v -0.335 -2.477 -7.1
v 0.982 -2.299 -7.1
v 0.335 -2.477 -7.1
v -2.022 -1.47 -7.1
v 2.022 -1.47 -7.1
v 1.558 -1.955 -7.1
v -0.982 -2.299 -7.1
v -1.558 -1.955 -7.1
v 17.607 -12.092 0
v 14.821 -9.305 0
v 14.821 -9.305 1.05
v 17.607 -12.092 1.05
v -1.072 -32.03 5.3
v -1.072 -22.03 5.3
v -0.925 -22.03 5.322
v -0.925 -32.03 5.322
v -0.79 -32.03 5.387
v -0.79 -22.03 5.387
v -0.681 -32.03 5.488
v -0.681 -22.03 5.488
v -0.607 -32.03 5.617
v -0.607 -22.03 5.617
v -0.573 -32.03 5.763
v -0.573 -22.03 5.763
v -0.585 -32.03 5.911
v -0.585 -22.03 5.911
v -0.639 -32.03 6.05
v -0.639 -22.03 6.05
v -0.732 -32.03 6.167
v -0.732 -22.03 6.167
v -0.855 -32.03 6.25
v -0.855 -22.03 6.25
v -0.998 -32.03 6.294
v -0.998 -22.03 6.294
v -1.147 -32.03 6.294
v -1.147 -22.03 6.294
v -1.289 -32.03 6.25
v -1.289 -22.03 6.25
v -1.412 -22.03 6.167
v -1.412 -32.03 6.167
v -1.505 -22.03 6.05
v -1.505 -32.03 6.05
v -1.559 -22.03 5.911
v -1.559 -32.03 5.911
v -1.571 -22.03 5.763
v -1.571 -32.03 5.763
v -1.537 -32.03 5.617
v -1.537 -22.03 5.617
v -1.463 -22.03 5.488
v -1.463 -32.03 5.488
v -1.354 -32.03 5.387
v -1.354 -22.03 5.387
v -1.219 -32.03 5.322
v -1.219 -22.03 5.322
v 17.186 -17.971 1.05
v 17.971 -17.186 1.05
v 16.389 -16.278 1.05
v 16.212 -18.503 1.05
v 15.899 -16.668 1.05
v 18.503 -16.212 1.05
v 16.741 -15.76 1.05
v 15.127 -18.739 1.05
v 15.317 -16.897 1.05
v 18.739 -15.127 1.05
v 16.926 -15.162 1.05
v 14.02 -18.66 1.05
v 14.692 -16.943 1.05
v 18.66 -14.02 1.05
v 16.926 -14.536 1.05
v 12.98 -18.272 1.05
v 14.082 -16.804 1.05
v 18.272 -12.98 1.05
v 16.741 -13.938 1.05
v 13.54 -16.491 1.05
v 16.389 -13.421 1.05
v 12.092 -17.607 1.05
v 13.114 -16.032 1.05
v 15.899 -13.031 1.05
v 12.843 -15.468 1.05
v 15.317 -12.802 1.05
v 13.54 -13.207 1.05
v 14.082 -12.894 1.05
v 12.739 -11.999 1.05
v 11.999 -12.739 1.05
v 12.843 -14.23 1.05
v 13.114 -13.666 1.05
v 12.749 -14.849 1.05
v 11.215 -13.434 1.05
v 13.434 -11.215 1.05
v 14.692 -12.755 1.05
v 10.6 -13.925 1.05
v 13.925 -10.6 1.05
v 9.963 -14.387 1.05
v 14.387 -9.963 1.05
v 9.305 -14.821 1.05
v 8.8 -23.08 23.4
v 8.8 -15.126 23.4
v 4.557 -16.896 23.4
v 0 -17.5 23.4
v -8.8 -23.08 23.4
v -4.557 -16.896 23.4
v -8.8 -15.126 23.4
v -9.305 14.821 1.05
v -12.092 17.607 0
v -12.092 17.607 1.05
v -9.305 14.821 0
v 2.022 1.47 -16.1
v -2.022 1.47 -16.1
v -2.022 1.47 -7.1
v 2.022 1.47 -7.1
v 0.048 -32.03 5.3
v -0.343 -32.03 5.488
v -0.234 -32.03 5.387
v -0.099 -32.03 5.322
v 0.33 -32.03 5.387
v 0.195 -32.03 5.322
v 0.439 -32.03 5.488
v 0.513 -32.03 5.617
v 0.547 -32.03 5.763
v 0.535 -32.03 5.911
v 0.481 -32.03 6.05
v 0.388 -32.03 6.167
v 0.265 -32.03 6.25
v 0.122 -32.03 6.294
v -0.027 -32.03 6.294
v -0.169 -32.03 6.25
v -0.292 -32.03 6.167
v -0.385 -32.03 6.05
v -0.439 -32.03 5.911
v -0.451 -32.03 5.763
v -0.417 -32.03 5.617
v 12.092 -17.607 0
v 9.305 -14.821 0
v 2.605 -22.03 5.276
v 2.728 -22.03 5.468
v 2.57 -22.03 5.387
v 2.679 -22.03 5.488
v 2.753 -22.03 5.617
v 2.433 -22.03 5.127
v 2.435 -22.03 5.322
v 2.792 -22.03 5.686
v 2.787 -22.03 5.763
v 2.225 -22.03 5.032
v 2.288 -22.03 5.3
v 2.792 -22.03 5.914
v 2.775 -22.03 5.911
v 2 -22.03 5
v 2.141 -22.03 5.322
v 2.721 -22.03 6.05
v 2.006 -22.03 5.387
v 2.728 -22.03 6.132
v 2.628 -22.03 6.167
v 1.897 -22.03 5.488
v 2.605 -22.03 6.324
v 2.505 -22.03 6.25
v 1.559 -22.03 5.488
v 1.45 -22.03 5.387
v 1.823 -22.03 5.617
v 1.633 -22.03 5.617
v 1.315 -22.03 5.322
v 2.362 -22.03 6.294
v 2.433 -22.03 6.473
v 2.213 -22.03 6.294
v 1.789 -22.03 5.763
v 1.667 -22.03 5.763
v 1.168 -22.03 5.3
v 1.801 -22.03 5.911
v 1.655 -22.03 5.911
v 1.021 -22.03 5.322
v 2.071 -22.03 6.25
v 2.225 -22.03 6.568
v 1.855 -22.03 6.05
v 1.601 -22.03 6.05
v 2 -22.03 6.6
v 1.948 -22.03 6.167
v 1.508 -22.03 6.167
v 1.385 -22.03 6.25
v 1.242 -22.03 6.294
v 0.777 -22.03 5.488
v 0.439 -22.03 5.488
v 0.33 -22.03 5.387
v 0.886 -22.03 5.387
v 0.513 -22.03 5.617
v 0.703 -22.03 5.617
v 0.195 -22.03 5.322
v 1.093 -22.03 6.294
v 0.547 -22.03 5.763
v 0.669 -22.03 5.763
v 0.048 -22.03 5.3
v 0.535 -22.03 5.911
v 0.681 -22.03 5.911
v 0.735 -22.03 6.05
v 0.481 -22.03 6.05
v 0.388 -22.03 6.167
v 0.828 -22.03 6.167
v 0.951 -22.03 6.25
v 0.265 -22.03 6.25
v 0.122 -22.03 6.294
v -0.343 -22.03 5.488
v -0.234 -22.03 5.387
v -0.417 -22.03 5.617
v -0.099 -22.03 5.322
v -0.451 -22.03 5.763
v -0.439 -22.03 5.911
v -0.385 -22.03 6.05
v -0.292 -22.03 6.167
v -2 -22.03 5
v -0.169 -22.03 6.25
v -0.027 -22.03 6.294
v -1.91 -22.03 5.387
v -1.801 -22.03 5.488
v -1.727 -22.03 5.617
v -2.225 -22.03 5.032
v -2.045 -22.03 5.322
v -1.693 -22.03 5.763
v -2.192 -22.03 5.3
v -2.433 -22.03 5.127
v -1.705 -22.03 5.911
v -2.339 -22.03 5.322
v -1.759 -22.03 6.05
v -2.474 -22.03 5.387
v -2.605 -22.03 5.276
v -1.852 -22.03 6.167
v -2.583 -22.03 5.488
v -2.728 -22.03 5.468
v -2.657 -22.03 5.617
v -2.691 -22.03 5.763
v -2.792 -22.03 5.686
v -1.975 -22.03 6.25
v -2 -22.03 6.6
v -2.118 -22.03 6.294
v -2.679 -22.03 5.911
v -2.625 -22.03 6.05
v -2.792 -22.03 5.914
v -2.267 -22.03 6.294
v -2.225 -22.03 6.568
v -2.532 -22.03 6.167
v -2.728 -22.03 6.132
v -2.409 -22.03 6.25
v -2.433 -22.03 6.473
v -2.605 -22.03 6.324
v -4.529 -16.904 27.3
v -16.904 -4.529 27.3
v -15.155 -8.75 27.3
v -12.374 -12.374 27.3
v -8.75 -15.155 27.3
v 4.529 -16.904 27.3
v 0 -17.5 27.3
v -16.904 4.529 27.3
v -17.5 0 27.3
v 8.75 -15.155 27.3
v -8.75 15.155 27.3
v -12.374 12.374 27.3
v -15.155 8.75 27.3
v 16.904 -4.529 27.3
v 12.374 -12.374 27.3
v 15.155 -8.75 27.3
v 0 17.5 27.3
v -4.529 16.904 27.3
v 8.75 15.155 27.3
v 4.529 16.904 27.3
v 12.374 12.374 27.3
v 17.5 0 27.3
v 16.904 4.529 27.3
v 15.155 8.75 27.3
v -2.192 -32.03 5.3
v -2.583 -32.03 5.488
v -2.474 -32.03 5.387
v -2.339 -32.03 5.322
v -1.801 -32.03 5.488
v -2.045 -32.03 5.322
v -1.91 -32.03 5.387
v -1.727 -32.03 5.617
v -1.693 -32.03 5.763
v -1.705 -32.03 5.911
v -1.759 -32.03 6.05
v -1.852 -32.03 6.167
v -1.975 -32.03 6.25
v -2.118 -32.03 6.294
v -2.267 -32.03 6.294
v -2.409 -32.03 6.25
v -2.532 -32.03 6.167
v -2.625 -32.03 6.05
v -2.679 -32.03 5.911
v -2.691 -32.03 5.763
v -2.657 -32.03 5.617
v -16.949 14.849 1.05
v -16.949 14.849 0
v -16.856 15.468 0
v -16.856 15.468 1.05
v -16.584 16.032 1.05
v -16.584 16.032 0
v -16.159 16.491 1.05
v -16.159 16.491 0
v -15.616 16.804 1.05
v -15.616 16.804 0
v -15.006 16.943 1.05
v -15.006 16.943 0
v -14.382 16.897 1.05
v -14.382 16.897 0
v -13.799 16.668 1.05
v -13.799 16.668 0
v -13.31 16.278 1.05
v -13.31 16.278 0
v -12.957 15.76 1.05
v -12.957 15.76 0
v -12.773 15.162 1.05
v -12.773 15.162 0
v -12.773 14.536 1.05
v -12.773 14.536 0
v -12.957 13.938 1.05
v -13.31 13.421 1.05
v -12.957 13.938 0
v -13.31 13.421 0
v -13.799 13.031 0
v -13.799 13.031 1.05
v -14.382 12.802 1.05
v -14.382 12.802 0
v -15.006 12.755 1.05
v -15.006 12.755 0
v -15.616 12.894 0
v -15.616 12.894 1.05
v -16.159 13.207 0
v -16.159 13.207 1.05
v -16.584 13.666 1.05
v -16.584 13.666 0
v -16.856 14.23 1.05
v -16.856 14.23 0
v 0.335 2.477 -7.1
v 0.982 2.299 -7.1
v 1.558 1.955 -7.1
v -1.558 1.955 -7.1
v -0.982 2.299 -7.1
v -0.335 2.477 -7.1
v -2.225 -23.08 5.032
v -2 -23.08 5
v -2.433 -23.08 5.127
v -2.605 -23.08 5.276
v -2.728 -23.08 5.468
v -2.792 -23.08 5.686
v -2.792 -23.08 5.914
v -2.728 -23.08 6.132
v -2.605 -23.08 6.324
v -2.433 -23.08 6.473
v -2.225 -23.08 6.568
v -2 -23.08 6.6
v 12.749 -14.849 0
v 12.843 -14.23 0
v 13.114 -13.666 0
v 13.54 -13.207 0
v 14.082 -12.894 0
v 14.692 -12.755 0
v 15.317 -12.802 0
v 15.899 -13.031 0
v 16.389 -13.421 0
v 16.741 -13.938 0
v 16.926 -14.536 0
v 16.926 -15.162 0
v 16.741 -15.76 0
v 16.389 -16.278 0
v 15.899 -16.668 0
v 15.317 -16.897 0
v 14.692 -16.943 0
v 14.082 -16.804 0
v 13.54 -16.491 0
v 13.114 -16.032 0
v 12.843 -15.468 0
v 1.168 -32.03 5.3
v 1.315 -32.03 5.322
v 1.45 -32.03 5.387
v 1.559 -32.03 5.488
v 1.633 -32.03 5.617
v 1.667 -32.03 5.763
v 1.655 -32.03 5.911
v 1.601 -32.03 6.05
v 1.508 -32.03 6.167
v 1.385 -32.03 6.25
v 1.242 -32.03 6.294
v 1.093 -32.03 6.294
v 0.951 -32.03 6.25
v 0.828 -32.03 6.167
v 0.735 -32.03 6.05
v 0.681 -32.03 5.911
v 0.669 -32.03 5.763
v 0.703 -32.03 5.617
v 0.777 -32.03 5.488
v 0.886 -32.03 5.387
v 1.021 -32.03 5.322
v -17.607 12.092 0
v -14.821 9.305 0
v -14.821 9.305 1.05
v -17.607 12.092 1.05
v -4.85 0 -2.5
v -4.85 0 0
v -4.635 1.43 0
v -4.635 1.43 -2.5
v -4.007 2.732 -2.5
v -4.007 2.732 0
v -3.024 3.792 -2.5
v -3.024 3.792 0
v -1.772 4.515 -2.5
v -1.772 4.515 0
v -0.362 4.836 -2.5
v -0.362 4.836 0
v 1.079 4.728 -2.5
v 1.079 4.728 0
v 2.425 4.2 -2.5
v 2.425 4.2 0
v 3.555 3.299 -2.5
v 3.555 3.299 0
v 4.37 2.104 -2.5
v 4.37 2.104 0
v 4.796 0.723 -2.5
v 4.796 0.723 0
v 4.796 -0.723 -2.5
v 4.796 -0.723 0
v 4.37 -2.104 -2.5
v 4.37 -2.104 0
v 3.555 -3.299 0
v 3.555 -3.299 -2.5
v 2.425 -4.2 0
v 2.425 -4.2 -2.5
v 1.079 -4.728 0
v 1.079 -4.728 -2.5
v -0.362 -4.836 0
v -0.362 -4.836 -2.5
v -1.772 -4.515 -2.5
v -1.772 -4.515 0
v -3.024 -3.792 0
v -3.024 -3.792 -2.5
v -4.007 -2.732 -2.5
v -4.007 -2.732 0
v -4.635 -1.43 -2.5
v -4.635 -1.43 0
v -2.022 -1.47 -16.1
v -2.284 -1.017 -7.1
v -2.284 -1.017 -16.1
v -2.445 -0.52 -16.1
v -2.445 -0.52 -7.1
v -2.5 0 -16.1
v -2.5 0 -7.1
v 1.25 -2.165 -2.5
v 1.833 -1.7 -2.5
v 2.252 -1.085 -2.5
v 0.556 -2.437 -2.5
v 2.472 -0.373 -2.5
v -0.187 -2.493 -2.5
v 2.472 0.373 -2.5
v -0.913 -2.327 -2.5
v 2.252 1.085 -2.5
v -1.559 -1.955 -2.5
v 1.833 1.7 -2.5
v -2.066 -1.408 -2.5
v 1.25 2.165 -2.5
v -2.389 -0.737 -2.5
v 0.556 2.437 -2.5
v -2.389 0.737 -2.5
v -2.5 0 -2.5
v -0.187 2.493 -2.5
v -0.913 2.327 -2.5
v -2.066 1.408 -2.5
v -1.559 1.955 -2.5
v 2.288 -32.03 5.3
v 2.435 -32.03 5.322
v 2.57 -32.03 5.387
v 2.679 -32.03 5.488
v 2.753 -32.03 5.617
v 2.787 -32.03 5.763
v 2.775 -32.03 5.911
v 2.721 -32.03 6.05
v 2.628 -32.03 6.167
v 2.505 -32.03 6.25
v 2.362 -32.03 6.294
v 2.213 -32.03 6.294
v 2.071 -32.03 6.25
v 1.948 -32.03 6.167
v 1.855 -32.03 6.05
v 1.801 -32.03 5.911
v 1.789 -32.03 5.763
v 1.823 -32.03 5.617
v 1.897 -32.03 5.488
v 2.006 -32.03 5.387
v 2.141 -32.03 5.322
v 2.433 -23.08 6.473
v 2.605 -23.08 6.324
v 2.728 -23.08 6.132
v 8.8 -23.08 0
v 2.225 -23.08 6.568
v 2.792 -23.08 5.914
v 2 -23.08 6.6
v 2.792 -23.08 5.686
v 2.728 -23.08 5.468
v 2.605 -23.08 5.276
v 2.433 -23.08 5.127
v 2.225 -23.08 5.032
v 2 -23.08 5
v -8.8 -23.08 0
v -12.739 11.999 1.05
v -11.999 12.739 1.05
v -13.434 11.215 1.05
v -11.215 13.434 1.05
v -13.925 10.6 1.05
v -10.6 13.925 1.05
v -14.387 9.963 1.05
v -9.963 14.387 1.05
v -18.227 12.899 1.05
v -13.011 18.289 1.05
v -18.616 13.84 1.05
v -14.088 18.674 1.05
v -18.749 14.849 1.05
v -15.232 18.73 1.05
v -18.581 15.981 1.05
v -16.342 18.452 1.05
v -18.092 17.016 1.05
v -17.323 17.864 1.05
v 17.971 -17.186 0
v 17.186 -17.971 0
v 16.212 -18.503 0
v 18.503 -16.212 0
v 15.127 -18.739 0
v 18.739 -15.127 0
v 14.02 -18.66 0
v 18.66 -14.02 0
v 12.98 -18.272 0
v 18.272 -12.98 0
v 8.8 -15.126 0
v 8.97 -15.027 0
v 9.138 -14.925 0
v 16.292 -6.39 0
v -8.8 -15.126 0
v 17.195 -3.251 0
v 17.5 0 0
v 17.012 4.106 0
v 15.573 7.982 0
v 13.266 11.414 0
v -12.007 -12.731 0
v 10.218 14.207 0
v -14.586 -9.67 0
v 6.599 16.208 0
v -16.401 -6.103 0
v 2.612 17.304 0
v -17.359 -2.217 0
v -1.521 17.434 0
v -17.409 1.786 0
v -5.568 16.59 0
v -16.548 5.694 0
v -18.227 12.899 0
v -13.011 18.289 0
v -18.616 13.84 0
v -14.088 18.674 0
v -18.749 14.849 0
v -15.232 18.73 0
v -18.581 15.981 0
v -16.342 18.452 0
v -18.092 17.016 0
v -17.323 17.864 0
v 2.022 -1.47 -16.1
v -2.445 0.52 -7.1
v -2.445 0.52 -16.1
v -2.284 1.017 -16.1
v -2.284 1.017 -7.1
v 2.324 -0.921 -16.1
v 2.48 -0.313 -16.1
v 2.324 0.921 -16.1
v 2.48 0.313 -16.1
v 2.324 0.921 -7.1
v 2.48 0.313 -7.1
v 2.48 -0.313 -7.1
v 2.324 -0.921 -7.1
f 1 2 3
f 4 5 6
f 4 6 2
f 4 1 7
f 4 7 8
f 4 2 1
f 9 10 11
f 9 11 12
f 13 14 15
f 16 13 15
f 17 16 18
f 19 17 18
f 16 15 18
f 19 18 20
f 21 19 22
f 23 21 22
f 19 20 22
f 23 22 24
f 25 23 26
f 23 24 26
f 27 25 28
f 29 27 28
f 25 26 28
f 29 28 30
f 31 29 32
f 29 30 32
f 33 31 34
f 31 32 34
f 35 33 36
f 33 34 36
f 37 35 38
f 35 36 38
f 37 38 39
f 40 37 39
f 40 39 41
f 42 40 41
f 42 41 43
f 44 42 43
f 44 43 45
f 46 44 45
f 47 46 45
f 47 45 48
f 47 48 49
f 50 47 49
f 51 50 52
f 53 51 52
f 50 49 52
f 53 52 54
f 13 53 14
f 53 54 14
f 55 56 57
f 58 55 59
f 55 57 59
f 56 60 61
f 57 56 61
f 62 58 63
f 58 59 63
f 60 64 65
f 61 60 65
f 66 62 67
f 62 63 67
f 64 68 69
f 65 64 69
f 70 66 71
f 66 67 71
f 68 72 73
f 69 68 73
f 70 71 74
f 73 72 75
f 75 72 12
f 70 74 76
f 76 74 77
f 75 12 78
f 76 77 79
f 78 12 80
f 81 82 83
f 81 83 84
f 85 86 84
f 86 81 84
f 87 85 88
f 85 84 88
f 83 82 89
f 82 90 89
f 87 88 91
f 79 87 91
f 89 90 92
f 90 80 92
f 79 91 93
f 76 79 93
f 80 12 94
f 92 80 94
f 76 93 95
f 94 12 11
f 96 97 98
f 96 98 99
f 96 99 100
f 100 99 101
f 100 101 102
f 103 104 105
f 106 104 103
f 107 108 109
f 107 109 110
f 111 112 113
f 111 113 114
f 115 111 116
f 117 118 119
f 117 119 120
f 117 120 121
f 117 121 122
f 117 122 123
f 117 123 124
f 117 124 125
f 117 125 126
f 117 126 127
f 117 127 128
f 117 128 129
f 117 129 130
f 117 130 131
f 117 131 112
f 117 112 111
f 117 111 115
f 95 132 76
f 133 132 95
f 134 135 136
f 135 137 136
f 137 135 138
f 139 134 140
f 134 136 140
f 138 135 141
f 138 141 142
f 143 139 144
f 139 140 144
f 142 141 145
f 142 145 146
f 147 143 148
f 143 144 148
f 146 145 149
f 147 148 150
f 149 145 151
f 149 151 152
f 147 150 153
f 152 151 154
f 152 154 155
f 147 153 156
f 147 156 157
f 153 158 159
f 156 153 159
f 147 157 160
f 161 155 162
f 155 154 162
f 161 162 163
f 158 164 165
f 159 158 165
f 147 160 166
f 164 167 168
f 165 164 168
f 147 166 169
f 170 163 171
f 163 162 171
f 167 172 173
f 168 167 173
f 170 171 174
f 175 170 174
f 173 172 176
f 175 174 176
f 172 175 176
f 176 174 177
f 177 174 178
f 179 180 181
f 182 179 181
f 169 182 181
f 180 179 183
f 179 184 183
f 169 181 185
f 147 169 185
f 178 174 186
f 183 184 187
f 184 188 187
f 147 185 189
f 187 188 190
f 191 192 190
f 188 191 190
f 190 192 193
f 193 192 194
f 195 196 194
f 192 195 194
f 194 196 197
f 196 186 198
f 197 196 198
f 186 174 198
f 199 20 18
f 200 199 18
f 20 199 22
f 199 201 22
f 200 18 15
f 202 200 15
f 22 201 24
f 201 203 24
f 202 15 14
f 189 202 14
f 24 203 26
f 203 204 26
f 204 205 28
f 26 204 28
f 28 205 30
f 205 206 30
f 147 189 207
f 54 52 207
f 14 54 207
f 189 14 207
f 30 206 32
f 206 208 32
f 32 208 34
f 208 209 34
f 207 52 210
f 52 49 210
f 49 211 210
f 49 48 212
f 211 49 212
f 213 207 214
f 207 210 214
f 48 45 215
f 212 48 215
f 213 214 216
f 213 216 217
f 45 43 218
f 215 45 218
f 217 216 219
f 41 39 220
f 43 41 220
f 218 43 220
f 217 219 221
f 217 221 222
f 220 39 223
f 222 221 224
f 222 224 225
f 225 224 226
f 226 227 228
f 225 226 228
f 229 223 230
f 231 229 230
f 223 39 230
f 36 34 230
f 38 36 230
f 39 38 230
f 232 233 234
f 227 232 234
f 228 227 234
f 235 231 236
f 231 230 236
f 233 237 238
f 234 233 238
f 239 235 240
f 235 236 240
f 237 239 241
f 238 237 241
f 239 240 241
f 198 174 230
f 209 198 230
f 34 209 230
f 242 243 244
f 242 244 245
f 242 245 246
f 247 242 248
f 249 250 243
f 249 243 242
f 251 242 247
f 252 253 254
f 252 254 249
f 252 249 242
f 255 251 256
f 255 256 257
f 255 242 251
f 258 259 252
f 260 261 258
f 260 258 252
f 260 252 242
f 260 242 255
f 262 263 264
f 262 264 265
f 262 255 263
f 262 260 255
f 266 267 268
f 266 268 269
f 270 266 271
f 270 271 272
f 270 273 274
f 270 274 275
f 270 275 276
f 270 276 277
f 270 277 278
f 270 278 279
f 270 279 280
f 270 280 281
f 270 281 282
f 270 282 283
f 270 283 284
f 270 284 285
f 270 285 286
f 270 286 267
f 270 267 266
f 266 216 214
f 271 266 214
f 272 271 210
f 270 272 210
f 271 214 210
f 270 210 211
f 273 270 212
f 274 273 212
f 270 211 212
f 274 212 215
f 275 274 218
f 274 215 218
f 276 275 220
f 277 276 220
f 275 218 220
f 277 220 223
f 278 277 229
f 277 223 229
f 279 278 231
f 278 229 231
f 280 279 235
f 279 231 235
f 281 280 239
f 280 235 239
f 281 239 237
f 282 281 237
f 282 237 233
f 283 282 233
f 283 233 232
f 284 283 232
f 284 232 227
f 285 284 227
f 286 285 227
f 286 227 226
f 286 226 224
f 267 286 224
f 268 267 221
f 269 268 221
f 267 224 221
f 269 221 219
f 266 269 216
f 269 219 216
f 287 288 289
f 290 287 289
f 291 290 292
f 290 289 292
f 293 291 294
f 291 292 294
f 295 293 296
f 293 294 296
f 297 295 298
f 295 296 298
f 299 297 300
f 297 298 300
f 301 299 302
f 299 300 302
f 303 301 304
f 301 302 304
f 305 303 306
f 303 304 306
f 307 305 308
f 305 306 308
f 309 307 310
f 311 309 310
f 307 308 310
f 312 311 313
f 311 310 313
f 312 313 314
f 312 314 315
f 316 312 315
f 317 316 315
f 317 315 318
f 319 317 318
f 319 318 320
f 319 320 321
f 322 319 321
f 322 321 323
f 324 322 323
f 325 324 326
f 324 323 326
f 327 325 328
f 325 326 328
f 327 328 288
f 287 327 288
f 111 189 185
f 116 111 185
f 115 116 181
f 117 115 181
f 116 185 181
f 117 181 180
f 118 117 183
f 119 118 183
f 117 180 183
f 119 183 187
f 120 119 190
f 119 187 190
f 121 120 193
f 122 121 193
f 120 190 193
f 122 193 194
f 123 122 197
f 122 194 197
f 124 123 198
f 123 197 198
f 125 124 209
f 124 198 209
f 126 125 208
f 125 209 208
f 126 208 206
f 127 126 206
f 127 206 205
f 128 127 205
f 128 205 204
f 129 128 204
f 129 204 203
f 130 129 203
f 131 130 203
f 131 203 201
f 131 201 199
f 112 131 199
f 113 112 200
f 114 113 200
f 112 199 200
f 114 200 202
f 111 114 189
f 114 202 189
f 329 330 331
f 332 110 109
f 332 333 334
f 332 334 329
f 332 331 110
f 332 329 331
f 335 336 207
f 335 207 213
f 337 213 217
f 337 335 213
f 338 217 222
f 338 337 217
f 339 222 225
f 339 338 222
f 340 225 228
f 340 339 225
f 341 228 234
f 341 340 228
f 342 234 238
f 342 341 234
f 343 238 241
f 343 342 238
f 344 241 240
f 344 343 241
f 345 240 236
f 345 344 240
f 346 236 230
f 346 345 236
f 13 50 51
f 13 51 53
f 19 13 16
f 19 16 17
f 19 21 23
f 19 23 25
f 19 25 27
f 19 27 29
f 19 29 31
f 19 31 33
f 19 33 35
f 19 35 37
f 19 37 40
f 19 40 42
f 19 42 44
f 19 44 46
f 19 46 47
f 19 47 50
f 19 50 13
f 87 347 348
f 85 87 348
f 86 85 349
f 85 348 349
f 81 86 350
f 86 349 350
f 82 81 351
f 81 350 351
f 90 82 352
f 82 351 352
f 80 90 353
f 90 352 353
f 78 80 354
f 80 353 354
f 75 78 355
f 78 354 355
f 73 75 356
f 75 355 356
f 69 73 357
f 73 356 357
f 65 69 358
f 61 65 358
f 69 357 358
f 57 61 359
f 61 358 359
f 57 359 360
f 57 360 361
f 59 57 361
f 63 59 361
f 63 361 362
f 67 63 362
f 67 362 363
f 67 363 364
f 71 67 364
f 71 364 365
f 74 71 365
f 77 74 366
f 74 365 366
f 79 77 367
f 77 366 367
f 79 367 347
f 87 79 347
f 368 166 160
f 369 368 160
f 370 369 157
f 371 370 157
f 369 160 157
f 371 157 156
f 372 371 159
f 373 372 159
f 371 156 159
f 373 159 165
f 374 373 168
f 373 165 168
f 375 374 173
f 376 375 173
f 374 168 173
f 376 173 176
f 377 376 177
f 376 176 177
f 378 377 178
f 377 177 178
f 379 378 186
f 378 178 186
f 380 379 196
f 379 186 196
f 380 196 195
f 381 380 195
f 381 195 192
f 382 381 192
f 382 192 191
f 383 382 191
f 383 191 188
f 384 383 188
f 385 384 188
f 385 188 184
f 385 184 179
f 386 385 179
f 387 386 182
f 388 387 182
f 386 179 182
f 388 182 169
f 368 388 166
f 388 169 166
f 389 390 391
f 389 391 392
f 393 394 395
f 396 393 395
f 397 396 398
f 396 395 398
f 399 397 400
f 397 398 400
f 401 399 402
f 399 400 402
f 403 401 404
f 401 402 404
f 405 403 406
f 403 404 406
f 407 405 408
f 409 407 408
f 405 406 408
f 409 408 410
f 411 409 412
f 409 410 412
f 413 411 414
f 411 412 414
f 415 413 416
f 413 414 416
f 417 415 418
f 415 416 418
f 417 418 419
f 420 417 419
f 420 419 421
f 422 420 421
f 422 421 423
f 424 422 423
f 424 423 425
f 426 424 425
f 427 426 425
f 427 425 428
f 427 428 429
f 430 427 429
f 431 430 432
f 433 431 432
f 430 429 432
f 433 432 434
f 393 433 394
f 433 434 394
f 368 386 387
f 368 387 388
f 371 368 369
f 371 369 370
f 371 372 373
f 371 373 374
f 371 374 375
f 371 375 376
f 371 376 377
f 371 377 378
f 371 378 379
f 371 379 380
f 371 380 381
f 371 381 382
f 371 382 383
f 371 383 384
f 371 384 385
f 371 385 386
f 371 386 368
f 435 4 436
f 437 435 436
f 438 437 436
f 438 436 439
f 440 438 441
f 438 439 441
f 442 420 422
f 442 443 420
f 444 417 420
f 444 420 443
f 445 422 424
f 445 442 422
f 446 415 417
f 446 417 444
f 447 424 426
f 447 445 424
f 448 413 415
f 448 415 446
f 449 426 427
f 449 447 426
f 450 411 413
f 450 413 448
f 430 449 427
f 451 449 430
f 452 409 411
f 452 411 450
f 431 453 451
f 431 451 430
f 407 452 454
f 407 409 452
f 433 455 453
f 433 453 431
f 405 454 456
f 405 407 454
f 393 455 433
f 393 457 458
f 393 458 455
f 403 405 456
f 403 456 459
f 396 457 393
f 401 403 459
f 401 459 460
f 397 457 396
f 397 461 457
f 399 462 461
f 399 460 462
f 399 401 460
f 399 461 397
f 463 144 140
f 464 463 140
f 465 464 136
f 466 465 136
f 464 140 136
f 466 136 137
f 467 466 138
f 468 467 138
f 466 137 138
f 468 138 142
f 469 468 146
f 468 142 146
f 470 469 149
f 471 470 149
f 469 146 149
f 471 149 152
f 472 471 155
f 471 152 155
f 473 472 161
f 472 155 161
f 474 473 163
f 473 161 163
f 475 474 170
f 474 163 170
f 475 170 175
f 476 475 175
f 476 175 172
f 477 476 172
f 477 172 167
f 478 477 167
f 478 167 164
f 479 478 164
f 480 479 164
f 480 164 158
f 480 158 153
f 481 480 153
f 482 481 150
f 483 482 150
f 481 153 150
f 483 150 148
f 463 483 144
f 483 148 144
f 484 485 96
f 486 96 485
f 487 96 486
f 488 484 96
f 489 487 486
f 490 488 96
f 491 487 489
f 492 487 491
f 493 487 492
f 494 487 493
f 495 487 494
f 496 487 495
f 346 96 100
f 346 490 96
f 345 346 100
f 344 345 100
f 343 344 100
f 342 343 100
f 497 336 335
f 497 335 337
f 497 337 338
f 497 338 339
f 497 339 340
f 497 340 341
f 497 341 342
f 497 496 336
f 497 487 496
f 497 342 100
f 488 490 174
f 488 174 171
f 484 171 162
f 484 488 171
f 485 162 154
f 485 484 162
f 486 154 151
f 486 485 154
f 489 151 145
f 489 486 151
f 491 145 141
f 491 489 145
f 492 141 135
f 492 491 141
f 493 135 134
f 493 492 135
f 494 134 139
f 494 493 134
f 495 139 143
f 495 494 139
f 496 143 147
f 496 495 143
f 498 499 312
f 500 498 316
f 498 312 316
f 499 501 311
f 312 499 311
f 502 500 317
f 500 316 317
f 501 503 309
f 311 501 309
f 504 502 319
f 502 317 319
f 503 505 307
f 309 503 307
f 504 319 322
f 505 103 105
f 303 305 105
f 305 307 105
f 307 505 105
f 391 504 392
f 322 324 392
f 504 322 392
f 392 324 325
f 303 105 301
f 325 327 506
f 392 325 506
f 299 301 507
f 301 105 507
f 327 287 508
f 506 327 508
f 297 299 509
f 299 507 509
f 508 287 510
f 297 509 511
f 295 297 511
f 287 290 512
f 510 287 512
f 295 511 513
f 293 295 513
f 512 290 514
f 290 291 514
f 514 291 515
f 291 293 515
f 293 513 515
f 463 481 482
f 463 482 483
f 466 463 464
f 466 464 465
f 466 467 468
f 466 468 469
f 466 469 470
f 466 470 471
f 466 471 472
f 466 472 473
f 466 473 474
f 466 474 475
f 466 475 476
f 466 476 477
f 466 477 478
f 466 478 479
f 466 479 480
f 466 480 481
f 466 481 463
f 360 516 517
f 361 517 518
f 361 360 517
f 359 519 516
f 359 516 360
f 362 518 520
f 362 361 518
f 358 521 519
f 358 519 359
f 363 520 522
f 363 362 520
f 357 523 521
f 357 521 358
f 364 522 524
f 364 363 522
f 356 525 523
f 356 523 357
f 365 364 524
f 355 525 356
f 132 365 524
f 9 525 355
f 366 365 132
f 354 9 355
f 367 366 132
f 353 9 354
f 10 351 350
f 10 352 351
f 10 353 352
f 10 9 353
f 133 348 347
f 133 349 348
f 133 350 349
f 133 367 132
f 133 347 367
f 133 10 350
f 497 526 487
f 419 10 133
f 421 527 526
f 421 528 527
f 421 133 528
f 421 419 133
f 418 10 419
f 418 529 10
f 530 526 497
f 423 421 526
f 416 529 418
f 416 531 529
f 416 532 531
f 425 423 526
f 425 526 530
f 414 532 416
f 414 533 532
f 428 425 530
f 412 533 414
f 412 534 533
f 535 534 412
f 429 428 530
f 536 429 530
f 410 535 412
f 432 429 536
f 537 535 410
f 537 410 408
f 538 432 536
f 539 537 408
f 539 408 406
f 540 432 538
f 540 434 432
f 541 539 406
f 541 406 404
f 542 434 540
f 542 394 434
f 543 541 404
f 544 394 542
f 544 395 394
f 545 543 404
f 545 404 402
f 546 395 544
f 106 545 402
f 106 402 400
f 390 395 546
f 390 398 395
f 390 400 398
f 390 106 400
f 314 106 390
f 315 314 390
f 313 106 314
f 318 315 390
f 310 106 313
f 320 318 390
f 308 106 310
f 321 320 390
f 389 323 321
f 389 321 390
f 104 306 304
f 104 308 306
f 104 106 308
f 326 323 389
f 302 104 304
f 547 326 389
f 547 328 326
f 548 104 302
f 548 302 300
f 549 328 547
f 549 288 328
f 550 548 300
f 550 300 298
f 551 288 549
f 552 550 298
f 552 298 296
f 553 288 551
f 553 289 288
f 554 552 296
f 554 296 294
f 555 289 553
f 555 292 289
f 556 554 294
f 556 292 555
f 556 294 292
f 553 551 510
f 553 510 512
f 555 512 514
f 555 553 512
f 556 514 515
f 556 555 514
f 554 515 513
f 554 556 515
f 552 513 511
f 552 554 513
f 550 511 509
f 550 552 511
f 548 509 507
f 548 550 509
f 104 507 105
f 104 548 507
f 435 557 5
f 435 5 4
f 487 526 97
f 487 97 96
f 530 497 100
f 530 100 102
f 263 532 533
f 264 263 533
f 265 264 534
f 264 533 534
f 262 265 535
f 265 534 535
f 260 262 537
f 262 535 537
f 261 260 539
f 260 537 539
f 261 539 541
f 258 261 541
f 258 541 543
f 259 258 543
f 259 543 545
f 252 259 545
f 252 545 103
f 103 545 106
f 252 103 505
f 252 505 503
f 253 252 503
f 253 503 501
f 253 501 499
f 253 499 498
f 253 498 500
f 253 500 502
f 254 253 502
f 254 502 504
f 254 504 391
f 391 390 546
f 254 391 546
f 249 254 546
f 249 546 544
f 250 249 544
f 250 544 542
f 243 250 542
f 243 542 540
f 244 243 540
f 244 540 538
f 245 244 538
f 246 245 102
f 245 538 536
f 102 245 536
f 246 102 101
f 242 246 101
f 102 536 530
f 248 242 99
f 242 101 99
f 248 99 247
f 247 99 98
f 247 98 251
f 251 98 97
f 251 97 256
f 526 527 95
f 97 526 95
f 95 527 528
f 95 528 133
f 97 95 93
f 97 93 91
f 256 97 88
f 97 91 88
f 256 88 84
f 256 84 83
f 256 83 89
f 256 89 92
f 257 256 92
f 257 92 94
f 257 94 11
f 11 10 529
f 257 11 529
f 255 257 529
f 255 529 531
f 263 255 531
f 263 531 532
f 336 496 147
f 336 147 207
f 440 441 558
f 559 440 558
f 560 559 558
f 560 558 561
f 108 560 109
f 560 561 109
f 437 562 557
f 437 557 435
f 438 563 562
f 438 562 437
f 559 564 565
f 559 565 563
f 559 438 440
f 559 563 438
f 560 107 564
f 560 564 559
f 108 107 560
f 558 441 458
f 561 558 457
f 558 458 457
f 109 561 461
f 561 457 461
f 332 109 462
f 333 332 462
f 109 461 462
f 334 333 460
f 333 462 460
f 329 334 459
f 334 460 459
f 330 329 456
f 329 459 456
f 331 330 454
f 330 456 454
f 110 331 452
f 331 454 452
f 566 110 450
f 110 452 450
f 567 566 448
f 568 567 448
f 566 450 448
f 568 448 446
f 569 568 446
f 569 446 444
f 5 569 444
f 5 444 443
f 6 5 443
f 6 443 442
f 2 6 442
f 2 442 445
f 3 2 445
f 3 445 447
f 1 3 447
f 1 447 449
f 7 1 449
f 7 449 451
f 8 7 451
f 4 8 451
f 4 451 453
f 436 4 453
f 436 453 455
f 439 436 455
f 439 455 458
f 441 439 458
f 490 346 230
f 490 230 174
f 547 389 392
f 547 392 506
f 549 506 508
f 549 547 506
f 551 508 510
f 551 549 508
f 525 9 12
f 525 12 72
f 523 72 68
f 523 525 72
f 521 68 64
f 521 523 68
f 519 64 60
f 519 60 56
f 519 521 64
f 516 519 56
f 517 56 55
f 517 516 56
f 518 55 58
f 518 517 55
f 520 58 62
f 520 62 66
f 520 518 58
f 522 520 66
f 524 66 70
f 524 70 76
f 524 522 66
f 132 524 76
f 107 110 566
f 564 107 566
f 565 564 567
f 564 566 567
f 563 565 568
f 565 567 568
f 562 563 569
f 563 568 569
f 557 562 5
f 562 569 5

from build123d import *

# Parameters (mm, degrees)
SKETCH_1_R          = 17.5
EXTRUDE_1_DEPTH     = 27.3
SKETCH_2_R          = 4.85
EXTRUDE_2_DEPTH     = 2.5
SKETCH_3_R          = 2.5
EXTRUDE_3_DEPTH     = 4.6
EXTRUDE_4_DEPTH     = 9
EXTRUDE_5_DEPTH     = 23.4
SKETCH_6_R          = 2.1
EXTRUDE_6_DEPTH     = 1.05
CUT_EXTRUDE_1_DEPTH = 1.05
SKETCH_8_R          = 0.5
EXTRUDE_7_DEPTH     = 10


with BuildPart() as part:
    # 草图1 → 凸台-拉伸1 (new body)
    with BuildSketch(Plane.XY):
        Circle(SKETCH_1_R)
    extrude(amount=EXTRUDE_1_DEPTH)

    # 草图2 → 凸台-拉伸2 (add)
    with BuildSketch(Plane(origin=(0, 0, 0), x_dir=(-1, 0, 0), z_dir=(0, 0, -1))):
        Circle(SKETCH_2_R)
    extrude(amount=EXTRUDE_2_DEPTH)

    # 草图3 → 凸台-拉伸3 (add)
    with BuildSketch(Plane(origin=(0, 0, -2.5), x_dir=(-1, 0, 0), z_dir=(0, 0, -1))):
        Circle(SKETCH_3_R)
    extrude(amount=EXTRUDE_3_DEPTH)

    # 草图4 → 凸台-拉伸4 (add)
    with BuildSketch(Plane(origin=(0, 0, -7.1), x_dir=(-1, 0, 0), z_dir=(0, 0, -1))):
        with BuildLine():
            Line((2.022152319, 1.47), (-2.022152319, 1.47))
            ThreePointArc((-2.022152319, 1.47), (-2.5, 0), (-2.022152319, -1.47))
            Line((-2.022152319, -1.47), (2.022152319, -1.47))
            ThreePointArc((2.022152319, -1.47), (2.377538727, -0.772858073), (2.5, 0))
            ThreePointArc((2.5, 0), (2.377538727, 0.772858073), (2.022152319, 1.47))
        make_face()
    extrude(amount=EXTRUDE_4_DEPTH)

    # 草图5 → 凸台-拉伸5 (add)
    with BuildSketch(Plane(origin=(0, 0, 0), x_dir=(-1, 0, 0), z_dir=(0, 0, -1))):
        with BuildLine():
            ThreePointArc((8.8, -15.126466871), (0, -17.5), (-8.8, -15.126466871))
            Line((-8.8, -15.126466871), (-8.8, -23.08))
            Line((-8.8, -23.08), (8.8, -23.08))
            Line((8.8, -23.08), (8.8, -15.126466871))
        make_face()
    extrude(amount=-EXTRUDE_5_DEPTH)

    # 草图6 → 凸台-拉伸6 (add)
    # profile 1 of 6: a face of its own
    with BuildSketch(Plane(origin=(0, 0, 0), x_dir=(-1, 0, 0), z_dir=(0, 0, -1))):
        with BuildLine():
            ThreePointArc((-13.433971222, -11.215097736), (-15.650847937, -11.032512316), (-17.606958852, -12.091525958))
            ThreePointArc((-17.606958852, -12.091525958), (-17.606958852, -17.606958852), (-12.091525958, -17.606958852))
            ThreePointArc((-12.091525958, -17.606958852), (-11.246112228, -16.341707791), (-10.949242405, -14.849242405))
            ThreePointArc((-10.949242405, -14.849242405), (-11.016282438, -14.129229978), (-11.215097736, -13.433971222))
            ThreePointArc((-11.215097736, -13.433971222), (-12.374368671, -12.374368671), (-13.433971222, -11.215097736))
        make_face()
        with Locations((-14.849242405, -14.849242405)):
            Circle(SKETCH_6_R, mode=Mode.SUBTRACT)
    # profile 2 of 6: a face of its own
    with BuildSketch(Plane(origin=(0, 0, 0), x_dir=(-1, 0, 0), z_dir=(0, 0, -1))):
        with BuildLine():
            ThreePointArc((-10.949242405, -14.849242405), (-11.246112228, -16.341707791), (-12.091525958, -17.606958852))
            Line((-12.091525958, -17.606958852), (-9.305450633, -14.820883527))
            ThreePointArc((-9.305450633, -14.820883527), (-10.283681626, -14.159657207), (-11.215097736, -13.433971222))
            ThreePointArc((-11.215097736, -13.433971222), (-11.016282438, -14.129229978), (-10.949242405, -14.849242405))
        make_face()
    # profile 3 of 6: a face of its own
    with BuildSketch(Plane(origin=(0, 0, 0), x_dir=(-1, 0, 0), z_dir=(0, 0, -1))):
        with BuildLine():
            ThreePointArc((-13.433971222, -11.215097736), (-14.159657207, -10.283681626), (-14.820883527, -9.305450633))
            Line((-14.820883527, -9.305450633), (-17.606958852, -12.091525958))
            ThreePointArc((-17.606958852, -12.091525958), (-15.650847937, -11.032512316), (-13.433971222, -11.215097736))
        make_face()
    # profile 4 of 6: a face of its own
    with BuildSketch(Plane(origin=(0, 0, 0), x_dir=(-1, 0, 0), z_dir=(0, 0, -1))):
        with BuildLine():
            ThreePointArc((18.749242405, 14.849242405), (16.341707791, 18.452372582), (12.091525958, 17.606958852))
            ThreePointArc((12.091525958, 17.606958852), (11.032512316, 15.650847937), (11.215097736, 13.433971222))
            ThreePointArc((11.215097736, 13.433971222), (12.374368671, 12.374368671), (13.433971222, 11.215097736))
            ThreePointArc((13.433971222, 11.215097736), (15.650847937, 11.032512316), (17.606958852, 12.091525958))
            ThreePointArc((17.606958852, 12.091525958), (18.452372582, 13.356777019), (18.749242405, 14.849242405))
        make_face()
        with Locations((14.849242405, 14.849242405)):
            Circle(SKETCH_6_R, mode=Mode.SUBTRACT)
    # profile 5 of 6: a face of its own
    with BuildSketch(Plane(origin=(0, 0, 0), x_dir=(-1, 0, 0), z_dir=(0, 0, -1))):
        with BuildLine():
            ThreePointArc((17.606958852, 12.091525958), (15.650847937, 11.032512316), (13.433971222, 11.215097736))
            ThreePointArc((13.433971222, 11.215097736), (14.159657207, 10.283681626), (14.820883527, 9.305450633))
            Line((14.820883527, 9.305450633), (17.606958852, 12.091525958))
        make_face()
    # profile 6 of 6: a face of its own
    with BuildSketch(Plane(origin=(0, 0, 0), x_dir=(-1, 0, 0), z_dir=(0, 0, -1))):
        with BuildLine():
            Line((12.091525958, 17.606958852), (9.305450633, 14.820883527))
            ThreePointArc((9.305450633, 14.820883527), (10.283681626, 14.159657207), (11.215097736, 13.433971222))
            ThreePointArc((11.215097736, 13.433971222), (11.032512316, 15.650847937), (12.091525958, 17.606958852))
        make_face()
    extrude(amount=-EXTRUDE_6_DEPTH)

    # 草图7 → 切除-拉伸1 (cut)
    with BuildSketch(Plane.XZ.offset(23.08)):
        with BuildLine():
            Line((-2, 6.6), (2, 6.6))
            ThreePointArc((2, 6.6), (2.8, 5.8), (2, 5))
            Line((2, 5), (-2, 5))
            ThreePointArc((-2, 5), (-2.8, 5.8), (-2, 6.6))
        make_face()
    extrude(amount=-CUT_EXTRUDE_1_DEPTH, mode=Mode.SUBTRACT)

    # 草图8 → 凸台-拉伸7 (add)
    with BuildSketch(Plane.XZ.offset(22.03)):
        with Locations(Location((2.287967864, 5.8, 0), (0, 0, 270))):
            Circle(SKETCH_8_R)
        with Locations(Location((1.167967864, 5.8, 0), (0, 0, 270))):
            Circle(SKETCH_8_R)
        with Locations(Location((0.047967864, 5.8, 0), (0, 0, 270))):
            Circle(SKETCH_8_R)
        with Locations(Location((-1.072032136, 5.8, 0), (0, 0, 270))):
            Circle(SKETCH_8_R)
        with Locations(Location((-2.192032136, 5.8, 0), (0, 0, 270))):
            Circle(SKETCH_8_R)
    extrude(amount=EXTRUDE_7_DEPTH)


solid = part.part
